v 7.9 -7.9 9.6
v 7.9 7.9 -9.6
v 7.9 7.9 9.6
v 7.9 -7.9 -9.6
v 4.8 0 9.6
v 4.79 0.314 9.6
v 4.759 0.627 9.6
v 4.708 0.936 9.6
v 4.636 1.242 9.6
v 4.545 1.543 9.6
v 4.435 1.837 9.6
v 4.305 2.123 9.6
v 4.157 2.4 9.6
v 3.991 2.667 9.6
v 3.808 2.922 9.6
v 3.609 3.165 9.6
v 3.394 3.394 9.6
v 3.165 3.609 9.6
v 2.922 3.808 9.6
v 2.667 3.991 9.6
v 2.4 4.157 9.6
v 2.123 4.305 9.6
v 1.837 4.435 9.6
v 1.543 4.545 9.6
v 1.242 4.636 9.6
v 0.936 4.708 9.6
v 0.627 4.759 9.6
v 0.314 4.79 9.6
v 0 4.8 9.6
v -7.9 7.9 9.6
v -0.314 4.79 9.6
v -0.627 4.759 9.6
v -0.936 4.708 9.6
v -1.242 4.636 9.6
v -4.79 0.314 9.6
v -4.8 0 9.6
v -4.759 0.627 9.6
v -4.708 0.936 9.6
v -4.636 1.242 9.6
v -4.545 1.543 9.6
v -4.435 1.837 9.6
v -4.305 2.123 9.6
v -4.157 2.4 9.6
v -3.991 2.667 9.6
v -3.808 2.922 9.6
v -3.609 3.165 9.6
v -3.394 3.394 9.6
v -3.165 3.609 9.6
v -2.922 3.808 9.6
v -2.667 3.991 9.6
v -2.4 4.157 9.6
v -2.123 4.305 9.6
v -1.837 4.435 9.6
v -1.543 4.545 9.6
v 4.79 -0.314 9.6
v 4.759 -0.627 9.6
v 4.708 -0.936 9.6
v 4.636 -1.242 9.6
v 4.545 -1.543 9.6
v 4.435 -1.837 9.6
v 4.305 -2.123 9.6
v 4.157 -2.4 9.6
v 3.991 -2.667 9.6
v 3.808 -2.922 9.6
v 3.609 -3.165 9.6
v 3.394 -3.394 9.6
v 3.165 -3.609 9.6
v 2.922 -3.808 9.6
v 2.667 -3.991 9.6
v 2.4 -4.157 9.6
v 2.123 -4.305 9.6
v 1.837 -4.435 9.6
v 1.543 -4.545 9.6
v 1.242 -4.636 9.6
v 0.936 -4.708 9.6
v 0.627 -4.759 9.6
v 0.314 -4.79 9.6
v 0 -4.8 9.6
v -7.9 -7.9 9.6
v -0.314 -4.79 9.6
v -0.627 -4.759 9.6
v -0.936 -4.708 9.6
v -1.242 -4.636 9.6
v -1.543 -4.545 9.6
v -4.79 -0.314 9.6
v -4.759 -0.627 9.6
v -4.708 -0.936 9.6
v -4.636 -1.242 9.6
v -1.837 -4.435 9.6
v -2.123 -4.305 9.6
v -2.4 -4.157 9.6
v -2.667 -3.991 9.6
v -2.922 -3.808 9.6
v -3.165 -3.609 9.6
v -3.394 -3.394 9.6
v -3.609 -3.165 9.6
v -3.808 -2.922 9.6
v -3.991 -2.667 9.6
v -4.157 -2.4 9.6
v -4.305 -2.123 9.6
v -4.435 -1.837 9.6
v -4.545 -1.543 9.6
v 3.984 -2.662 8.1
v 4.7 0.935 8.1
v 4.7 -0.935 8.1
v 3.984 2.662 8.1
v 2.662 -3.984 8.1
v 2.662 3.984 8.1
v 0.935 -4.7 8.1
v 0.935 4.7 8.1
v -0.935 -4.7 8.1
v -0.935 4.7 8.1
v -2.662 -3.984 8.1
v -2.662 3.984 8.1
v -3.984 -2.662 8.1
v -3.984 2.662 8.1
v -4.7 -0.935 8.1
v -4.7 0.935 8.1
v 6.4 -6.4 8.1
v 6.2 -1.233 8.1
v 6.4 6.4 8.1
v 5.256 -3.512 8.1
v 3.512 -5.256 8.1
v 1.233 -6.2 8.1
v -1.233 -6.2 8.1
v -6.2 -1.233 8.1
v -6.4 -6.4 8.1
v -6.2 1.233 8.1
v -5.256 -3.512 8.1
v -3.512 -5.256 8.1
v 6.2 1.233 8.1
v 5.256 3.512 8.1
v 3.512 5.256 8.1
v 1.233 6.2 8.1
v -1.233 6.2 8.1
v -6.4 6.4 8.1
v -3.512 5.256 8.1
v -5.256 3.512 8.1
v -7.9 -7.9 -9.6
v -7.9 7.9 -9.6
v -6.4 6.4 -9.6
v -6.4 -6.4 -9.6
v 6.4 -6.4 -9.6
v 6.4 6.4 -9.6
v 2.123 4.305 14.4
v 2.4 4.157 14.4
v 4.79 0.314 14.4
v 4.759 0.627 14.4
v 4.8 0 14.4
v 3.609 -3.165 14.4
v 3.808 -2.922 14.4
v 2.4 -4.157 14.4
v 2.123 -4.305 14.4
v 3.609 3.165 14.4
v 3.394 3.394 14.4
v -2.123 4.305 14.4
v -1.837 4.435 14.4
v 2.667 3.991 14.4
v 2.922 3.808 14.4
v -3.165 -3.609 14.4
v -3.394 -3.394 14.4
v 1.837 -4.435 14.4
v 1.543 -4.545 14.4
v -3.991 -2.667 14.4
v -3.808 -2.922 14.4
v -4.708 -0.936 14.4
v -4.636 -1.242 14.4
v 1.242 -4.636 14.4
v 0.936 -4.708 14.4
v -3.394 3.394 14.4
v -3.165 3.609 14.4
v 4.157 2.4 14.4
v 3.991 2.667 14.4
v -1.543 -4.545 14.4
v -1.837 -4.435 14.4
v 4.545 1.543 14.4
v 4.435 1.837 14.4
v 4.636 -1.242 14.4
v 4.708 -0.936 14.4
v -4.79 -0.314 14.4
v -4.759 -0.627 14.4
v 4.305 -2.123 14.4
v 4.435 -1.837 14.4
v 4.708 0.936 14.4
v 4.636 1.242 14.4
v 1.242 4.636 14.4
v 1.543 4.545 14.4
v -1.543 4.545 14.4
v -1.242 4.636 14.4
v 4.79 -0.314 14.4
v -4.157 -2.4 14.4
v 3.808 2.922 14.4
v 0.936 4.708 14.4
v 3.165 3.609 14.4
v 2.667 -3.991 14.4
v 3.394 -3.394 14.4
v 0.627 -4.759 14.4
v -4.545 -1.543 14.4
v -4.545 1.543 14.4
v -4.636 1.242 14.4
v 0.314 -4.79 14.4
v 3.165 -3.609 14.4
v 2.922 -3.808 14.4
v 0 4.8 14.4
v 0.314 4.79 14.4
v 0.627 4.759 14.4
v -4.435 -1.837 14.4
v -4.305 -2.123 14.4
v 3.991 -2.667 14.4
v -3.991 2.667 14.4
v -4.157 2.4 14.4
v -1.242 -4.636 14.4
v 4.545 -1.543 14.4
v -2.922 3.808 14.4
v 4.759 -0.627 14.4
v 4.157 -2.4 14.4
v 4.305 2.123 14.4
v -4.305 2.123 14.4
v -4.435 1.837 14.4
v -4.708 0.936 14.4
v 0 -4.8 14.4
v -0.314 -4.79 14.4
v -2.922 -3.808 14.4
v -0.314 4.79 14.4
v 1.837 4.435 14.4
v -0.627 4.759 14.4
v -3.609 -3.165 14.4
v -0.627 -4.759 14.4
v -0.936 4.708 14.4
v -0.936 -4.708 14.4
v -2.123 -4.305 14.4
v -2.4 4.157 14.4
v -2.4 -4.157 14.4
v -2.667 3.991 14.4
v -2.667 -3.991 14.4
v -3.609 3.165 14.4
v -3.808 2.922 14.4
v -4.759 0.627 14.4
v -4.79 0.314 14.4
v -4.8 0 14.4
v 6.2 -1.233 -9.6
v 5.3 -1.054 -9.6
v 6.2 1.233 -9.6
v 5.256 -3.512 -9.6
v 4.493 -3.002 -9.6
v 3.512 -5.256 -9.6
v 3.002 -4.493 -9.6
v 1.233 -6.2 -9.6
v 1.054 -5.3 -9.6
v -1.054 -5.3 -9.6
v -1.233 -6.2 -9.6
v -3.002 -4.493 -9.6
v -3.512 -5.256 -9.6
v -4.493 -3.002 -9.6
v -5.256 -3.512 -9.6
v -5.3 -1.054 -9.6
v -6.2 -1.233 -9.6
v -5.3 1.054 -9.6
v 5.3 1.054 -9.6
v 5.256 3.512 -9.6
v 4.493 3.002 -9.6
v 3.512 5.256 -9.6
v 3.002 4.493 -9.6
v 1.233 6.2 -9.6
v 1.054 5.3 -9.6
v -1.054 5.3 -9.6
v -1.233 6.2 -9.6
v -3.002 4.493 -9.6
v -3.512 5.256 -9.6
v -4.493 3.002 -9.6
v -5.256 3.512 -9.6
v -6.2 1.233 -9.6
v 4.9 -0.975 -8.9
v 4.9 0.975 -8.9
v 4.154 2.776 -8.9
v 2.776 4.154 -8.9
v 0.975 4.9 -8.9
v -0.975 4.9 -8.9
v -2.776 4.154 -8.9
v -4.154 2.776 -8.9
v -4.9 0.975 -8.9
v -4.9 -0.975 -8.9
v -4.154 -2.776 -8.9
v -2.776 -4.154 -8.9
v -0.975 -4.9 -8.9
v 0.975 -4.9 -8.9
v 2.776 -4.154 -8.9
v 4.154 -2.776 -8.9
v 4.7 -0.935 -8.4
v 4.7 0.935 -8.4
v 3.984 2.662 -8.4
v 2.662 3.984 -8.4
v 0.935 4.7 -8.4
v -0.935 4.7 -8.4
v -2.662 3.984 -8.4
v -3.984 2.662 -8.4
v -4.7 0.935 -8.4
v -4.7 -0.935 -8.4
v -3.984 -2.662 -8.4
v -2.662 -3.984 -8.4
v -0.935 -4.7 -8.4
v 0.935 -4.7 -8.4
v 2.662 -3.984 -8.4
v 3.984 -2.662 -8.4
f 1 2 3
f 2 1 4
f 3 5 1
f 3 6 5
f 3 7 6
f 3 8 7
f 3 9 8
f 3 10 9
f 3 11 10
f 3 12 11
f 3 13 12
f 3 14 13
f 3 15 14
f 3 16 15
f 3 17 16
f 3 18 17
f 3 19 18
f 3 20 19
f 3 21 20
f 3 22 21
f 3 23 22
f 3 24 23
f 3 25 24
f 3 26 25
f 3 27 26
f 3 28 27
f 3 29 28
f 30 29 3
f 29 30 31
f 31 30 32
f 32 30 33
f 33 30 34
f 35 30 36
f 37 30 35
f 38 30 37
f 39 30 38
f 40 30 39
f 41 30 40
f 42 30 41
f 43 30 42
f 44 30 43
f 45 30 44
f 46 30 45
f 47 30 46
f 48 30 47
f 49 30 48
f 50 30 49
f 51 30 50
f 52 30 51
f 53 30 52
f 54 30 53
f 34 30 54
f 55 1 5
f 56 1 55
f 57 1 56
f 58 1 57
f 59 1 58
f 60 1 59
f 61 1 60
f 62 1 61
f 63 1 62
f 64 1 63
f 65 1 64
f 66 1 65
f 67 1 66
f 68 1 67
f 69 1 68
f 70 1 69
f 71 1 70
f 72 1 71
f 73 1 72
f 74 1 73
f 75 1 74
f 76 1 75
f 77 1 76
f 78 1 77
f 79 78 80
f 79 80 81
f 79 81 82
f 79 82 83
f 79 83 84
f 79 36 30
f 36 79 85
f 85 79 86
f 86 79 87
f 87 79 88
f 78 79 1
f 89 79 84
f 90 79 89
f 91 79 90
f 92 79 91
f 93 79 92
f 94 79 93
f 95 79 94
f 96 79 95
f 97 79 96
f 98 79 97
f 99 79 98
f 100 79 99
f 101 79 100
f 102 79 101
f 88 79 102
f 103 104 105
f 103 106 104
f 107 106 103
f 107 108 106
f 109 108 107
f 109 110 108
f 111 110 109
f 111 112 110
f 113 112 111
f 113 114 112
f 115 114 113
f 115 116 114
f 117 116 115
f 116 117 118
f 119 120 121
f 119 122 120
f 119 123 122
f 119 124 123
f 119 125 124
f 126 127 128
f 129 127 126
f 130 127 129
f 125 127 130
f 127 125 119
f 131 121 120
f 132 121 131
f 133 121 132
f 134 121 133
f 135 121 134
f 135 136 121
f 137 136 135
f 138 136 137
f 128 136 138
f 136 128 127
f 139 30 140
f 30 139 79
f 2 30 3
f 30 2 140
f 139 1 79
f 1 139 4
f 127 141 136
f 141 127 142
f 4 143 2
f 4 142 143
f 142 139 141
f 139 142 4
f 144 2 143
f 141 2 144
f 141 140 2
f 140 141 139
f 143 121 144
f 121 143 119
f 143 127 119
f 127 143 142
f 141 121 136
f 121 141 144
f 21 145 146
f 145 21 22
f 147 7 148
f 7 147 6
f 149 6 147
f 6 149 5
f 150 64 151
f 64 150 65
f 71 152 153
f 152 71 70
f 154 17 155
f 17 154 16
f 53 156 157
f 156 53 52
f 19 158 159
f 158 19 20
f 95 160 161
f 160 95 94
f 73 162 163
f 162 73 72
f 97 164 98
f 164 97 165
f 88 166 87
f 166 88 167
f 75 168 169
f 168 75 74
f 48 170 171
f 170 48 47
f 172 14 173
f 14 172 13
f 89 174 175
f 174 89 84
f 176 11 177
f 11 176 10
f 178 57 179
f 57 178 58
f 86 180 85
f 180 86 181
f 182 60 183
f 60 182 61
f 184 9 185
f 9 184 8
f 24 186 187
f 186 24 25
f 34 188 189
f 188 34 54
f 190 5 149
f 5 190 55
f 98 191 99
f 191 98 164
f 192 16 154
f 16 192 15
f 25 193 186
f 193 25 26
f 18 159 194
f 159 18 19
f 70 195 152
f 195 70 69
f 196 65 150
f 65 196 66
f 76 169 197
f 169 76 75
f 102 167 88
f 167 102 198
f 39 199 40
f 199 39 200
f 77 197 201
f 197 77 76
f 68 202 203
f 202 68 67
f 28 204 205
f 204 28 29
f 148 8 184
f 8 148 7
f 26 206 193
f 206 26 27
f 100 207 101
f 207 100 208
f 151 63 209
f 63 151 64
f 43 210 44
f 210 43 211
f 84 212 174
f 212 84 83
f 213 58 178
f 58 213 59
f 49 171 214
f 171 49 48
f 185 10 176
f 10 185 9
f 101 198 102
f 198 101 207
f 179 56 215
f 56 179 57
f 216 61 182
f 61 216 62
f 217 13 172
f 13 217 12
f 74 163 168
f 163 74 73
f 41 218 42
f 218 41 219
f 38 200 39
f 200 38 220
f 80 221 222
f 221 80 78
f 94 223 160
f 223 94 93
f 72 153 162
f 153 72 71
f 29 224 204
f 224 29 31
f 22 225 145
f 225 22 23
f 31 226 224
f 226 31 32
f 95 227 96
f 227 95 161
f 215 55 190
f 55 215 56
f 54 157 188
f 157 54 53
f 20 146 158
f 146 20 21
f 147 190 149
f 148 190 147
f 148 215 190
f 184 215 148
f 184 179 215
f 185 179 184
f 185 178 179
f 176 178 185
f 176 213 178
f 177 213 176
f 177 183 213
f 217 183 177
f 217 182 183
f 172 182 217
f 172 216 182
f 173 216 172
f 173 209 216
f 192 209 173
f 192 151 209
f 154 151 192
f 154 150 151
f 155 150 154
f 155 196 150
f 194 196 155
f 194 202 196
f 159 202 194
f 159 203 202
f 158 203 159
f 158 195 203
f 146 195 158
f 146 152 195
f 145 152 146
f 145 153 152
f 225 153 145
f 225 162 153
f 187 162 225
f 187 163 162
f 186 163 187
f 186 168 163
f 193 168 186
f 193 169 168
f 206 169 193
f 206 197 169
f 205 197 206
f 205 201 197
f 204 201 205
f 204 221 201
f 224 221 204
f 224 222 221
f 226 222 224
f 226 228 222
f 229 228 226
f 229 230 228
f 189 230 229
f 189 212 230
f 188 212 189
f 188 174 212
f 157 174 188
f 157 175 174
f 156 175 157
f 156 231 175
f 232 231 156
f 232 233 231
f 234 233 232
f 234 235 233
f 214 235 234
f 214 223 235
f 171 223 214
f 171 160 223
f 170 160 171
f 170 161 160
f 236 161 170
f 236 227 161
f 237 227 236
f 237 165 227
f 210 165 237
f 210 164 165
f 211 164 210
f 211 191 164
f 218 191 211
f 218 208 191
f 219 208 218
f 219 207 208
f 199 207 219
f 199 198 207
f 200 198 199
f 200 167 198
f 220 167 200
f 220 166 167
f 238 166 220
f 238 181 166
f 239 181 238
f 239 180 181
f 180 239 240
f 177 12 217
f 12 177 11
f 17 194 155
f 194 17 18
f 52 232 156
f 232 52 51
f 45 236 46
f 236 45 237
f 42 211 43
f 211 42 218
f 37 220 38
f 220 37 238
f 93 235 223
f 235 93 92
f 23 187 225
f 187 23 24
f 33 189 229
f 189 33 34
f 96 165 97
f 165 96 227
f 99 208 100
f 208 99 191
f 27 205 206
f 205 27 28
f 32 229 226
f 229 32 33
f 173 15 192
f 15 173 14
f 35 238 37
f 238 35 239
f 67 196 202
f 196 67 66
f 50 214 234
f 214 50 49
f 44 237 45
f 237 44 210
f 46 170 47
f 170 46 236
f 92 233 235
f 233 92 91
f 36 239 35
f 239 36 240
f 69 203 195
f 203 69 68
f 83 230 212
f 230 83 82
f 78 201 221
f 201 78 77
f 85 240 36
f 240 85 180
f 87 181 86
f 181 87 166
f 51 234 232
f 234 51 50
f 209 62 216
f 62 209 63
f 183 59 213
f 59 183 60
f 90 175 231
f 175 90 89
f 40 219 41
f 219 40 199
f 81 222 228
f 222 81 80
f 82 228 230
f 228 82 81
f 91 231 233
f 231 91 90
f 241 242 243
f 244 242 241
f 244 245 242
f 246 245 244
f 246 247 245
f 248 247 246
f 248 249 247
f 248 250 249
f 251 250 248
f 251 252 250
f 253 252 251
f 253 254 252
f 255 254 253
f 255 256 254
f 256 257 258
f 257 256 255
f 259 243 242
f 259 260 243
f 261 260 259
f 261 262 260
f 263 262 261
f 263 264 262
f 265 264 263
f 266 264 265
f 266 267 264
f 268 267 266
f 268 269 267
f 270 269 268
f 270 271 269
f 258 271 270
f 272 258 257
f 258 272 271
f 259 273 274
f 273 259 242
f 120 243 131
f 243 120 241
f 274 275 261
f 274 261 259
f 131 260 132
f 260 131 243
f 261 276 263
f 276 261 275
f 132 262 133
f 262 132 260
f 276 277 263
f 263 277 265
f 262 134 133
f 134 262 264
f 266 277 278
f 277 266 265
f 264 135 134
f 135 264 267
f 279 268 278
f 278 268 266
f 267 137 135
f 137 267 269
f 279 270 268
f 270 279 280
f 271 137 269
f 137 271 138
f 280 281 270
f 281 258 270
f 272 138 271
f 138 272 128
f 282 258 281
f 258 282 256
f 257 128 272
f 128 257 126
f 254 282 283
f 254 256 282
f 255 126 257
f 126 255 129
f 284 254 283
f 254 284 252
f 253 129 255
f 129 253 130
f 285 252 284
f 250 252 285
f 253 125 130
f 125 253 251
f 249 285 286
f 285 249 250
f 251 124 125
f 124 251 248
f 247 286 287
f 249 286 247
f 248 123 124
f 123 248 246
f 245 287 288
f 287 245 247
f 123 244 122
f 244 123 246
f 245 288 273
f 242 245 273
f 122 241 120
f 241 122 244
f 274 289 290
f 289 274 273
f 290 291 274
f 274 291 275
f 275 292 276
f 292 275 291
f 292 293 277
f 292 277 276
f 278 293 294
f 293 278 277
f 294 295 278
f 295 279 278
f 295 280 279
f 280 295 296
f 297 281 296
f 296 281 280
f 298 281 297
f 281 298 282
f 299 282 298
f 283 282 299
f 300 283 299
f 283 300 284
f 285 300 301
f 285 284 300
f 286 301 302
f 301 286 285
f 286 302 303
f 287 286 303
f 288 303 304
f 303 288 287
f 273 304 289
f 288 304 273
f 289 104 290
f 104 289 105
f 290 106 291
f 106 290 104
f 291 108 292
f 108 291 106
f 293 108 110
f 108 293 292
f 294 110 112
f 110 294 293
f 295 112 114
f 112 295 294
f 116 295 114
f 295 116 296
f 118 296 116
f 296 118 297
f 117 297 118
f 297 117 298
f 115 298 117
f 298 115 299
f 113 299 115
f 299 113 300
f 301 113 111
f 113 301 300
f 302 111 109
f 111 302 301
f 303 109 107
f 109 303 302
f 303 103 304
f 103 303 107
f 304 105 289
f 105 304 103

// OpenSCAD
// Custom 16 mm pitch construction brick; units: millimetres.
// Generated from geometry.py. Not a certified LEGO/Duplo part.
// Test material, fit and printer tolerances before physical use.
// Shape: [1, 1]; nominal radial interference: 0.1 mm.
$fn = 96;
union() {
  // roof; simulation contact: hard
  translate([0, 0, 8.85]) cube([15.8, 15.8, 1.5], center=true);
  // wall_x_neg; simulation contact: hard
  translate([-7.15, 0, -0.75]) cube([1.5, 15.8, 17.7], center=true);
  // wall_x_pos; simulation contact: hard
  translate([7.15, 0, -0.75]) cube([1.5, 15.8, 17.7], center=true);
  // wall_y_neg; simulation contact: hard
  translate([0, -7.15, -0.75]) cube([12.8, 1.5, 17.7], center=true);
  // wall_y_pos; simulation contact: hard
  translate([0, 7.15, -0.75]) cube([12.8, 1.5, 17.7], center=true);
  // stud_0; simulation contact: hard
  translate([0, 0, 12]) cylinder(h=4.8, r=4.8, center=true);
  // socket_0_entrance_00; simulation contact: hard
  polyhedron(points=[[5.3, -1.05423555, -9.6], [6.2, -1.23325668, -9.6], [6.2, 1.23325668, -9.6], [5.3, 1.05423555, -9.6], [4.9, -0.9746706, -8.9], [6.2, -1.23325668, -8.9], [6.2, 1.23325668, -8.9], [4.9, 0.9746706, -8.9]], faces=[[0, 1, 2, 3], [7, 6, 5, 4], [4, 5, 1, 0], [5, 6, 2, 1], [6, 7, 3, 2], [7, 4, 0, 3]], convexity=4);
  // socket_0_entrance_01; simulation contact: hard
  polyhedron(points=[[5.3, 1.05423555, -9.6], [6.2, 1.23325668, -9.6], [5.2561062, 3.51201788, -9.6], [4.49312304, 3.00220884, -9.6], [4.9, 0.9746706, -8.9], [6.2, 1.23325668, -8.9], [5.2561062, 3.51201788, -8.9], [4.15401942, 2.77562704, -8.9]], faces=[[0, 1, 2, 3], [7, 6, 5, 4], [4, 5, 1, 0], [5, 6, 2, 1], [6, 7, 3, 2], [7, 4, 0, 3]], convexity=4);
  // socket_0_entrance_02; simulation contact: hard
  polyhedron(points=[[4.49312304, 3.00220884, -9.6], [5.2561062, 3.51201788, -9.6], [3.51201788, 5.2561062, -9.6], [3.00220884, 4.49312304, -9.6], [4.15401942, 2.77562704, -8.9], [5.2561062, 3.51201788, -8.9], [3.51201788, 5.2561062, -8.9], [2.77562704, 4.15401942, -8.9]], faces=[[0, 1, 2, 3], [7, 6, 5, 4], [4, 5, 1, 0], [5, 6, 2, 1], [6, 7, 3, 2], [7, 4, 0, 3]], convexity=4);
  // socket_0_entrance_03; simulation contact: hard
  polyhedron(points=[[3.00220884, 4.49312304, -9.6], [3.51201788, 5.2561062, -9.6], [1.23325668, 6.2, -9.6], [1.05423555, 5.3, -9.6], [2.77562704, 4.15401942, -8.9], [3.51201788, 5.2561062, -8.9], [1.23325668, 6.2, -8.9], [0.9746706, 4.9, -8.9]], faces=[[0, 1, 2, 3], [7, 6, 5, 4], [4, 5, 1, 0], [5, 6, 2, 1], [6, 7, 3, 2], [7, 4, 0, 3]], convexity=4);
  // socket_0_entrance_04; simulation contact: hard
  polyhedron(points=[[1.05423555, 5.3, -9.6], [1.23325668, 6.2, -9.6], [-1.23325668, 6.2, -9.6], [-1.05423555, 5.3, -9.6], [0.9746706, 4.9, -8.9], [1.23325668, 6.2, -8.9], [-1.23325668, 6.2, -8.9], [-0.9746706, 4.9, -8.9]], faces=[[0, 1, 2, 3], [7, 6, 5, 4], [4, 5, 1, 0], [5, 6, 2, 1], [6, 7, 3, 2], [7, 4, 0, 3]], convexity=4);
  // socket_0_entrance_05; simulation contact: hard
  polyhedron(points=[[-1.05423555, 5.3, -9.6], [-1.23325668, 6.2, -9.6], [-3.51201788, 5.2561062, -9.6], [-3.00220884, 4.49312304, -9.6], [-0.9746706, 4.9, -8.9], [-1.23325668, 6.2, -8.9], [-3.51201788, 5.2561062, -8.9], [-2.77562704, 4.15401942, -8.9]], faces=[[0, 1, 2, 3], [7, 6, 5, 4], [4, 5, 1, 0], [5, 6, 2, 1], [6, 7, 3, 2], [7, 4, 0, 3]], convexity=4);
  // socket_0_entrance_06; simulation contact: hard
  polyhedron(points=[[-3.00220884, 4.49312304, -9.6], [-3.51201788, 5.2561062, -9.6], [-5.2561062, 3.51201788, -9.6], [-4.49312304, 3.00220884, -9.6], [-2.77562704, 4.15401942, -8.9], [-3.51201788, 5.2561062, -8.9], [-5.2561062, 3.51201788, -8.9], [-4.15401942, 2.77562704, -8.9]], faces=[[0, 1, 2, 3], [7, 6, 5, 4], [4, 5, 1, 0], [5, 6, 2, 1], [6, 7, 3, 2], [7, 4, 0, 3]], convexity=4);
  // socket_0_entrance_07; simulation contact: hard
  polyhedron(points=[[-4.49312304, 3.00220884, -9.6], [-5.2561062, 3.51201788, -9.6], [-6.2, 1.23325668, -9.6], [-5.3, 1.05423555, -9.6], [-4.15401942, 2.77562704, -8.9], [-5.2561062, 3.51201788, -8.9], [-6.2, 1.23325668, -8.9], [-4.9, 0.9746706, -8.9]], faces=[[0, 1, 2, 3], [7, 6, 5, 4], [4, 5, 1, 0], [5, 6, 2, 1], [6, 7, 3, 2], [7, 4, 0, 3]], convexity=4);
  // socket_0_entrance_08; simulation contact: hard
  polyhedron(points=[[-5.3, 1.05423555, -9.6], [-6.2, 1.23325668, -9.6], [-6.2, -1.23325668, -9.6], [-5.3, -1.05423555, -9.6], [-4.9, 0.9746706, -8.9], [-6.2, 1.23325668, -8.9], [-6.2, -1.23325668, -8.9], [-4.9, -0.9746706, -8.9]], faces=[[0, 1, 2, 3], [7, 6, 5, 4], [4, 5, 1, 0], [5, 6, 2, 1], [6, 7, 3, 2], [7, 4, 0, 3]], convexity=4);
  // socket_0_entrance_09; simulation contact: hard
  polyhedron(points=[[-5.3, -1.05423555, -9.6], [-6.2, -1.23325668, -9.6], [-5.2561062, -3.51201788, -9.6], [-4.49312304, -3.00220884, -9.6], [-4.9, -0.9746706, -8.9], [-6.2, -1.23325668, -8.9], [-5.2561062, -3.51201788, -8.9], [-4.15401942, -2.77562704, -8.9]], faces=[[0, 1, 2, 3], [7, 6, 5, 4], [4, 5, 1, 0], [5, 6, 2, 1], [6, 7, 3, 2], [7, 4, 0, 3]], convexity=4);
  // socket_0_entrance_10; simulation contact: hard
  polyhedron(points=[[-4.49312304, -3.00220884, -9.6], [-5.2561062, -3.51201788, -9.6], [-3.51201788, -5.2561062, -9.6], [-3.00220884, -4.49312304, -9.6], [-4.15401942, -2.77562704, -8.9], [-5.2561062, -3.51201788, -8.9], [-3.51201788, -5.2561062, -8.9], [-2.77562704, -4.15401942, -8.9]], faces=[[0, 1, 2, 3], [7, 6, 5, 4], [4, 5, 1, 0], [5, 6, 2, 1], [6, 7, 3, 2], [7, 4, 0, 3]], convexity=4);
  // socket_0_entrance_11; simulation contact: hard
  polyhedron(points=[[-3.00220884, -4.49312304, -9.6], [-3.51201788, -5.2561062, -9.6], [-1.23325668, -6.2, -9.6], [-1.05423555, -5.3, -9.6], [-2.77562704, -4.15401942, -8.9], [-3.51201788, -5.2561062, -8.9], [-1.23325668, -6.2, -8.9], [-0.9746706, -4.9, -8.9]], faces=[[0, 1, 2, 3], [7, 6, 5, 4], [4, 5, 1, 0], [5, 6, 2, 1], [6, 7, 3, 2], [7, 4, 0, 3]], convexity=4);
  // socket_0_entrance_12; simulation contact: hard
  polyhedron(points=[[-1.05423555, -5.3, -9.6], [-1.23325668, -6.2, -9.6], [1.23325668, -6.2, -9.6], [1.05423555, -5.3, -9.6], [-0.9746706, -4.9, -8.9], [-1.23325668, -6.2, -8.9], [1.23325668, -6.2, -8.9], [0.9746706, -4.9, -8.9]], faces=[[0, 1, 2, 3], [7, 6, 5, 4], [4, 5, 1, 0], [5, 6, 2, 1], [6, 7, 3, 2], [7, 4, 0, 3]], convexity=4);
  // socket_0_entrance_13; simulation contact: hard
  polyhedron(points=[[1.05423555, -5.3, -9.6], [1.23325668, -6.2, -9.6], [3.51201788, -5.2561062, -9.6], [3.00220884, -4.49312304, -9.6], [0.9746706, -4.9, -8.9], [1.23325668, -6.2, -8.9], [3.51201788, -5.2561062, -8.9], [2.77562704, -4.15401942, -8.9]], faces=[[0, 1, 2, 3], [7, 6, 5, 4], [4, 5, 1, 0], [5, 6, 2, 1], [6, 7, 3, 2], [7, 4, 0, 3]], convexity=4);
  // socket_0_entrance_14; simulation contact: hard
  polyhedron(points=[[3.00220884, -4.49312304, -9.6], [3.51201788, -5.2561062, -9.6], [5.2561062, -3.51201788, -9.6], [4.49312304, -3.00220884, -9.6], [2.77562704, -4.15401942, -8.9], [3.51201788, -5.2561062, -8.9], [5.2561062, -3.51201788, -8.9], [4.15401942, -2.77562704, -8.9]], faces=[[0, 1, 2, 3], [7, 6, 5, 4], [4, 5, 1, 0], [5, 6, 2, 1], [6, 7, 3, 2], [7, 4, 0, 3]], convexity=4);
  // socket_0_entrance_15; simulation contact: hard
  polyhedron(points=[[4.49312304, -3.00220884, -9.6], [5.2561062, -3.51201788, -9.6], [6.2, -1.23325668, -9.6], [5.3, -1.05423555, -9.6], [4.15401942, -2.77562704, -8.9], [5.2561062, -3.51201788, -8.9], [6.2, -1.23325668, -8.9], [4.9, -0.9746706, -8.9]], faces=[[0, 1, 2, 3], [7, 6, 5, 4], [4, 5, 1, 0], [5, 6, 2, 1], [6, 7, 3, 2], [7, 4, 0, 3]], convexity=4);
  // socket_0_taper_00; simulation contact: compliant
  polyhedron(points=[[4.9, -0.9746706, -8.9], [6.2, -1.23325668, -8.9], [6.2, 1.23325668, -8.9], [4.9, 0.9746706, -8.9], [4.7, -0.934888127, -8.4], [6.2, -1.23325668, -8.4], [6.2, 1.23325668, -8.4], [4.7, 0.934888127, -8.4]], faces=[[0, 1, 2, 3], [7, 6, 5, 4], [4, 5, 1, 0], [5, 6, 2, 1], [6, 7, 3, 2], [7, 4, 0, 3]], convexity=4);
  // socket_0_taper_01; simulation contact: compliant
  polyhedron(points=[[4.9, 0.9746706, -8.9], [6.2, 1.23325668, -8.9], [5.2561062, 3.51201788, -8.9], [4.15401942, 2.77562704, -8.9], [4.7, 0.934888127, -8.4], [6.2, 1.23325668, -8.4], [5.2561062, 3.51201788, -8.4], [3.98446761, 2.66233614, -8.4]], faces=[[0, 1, 2, 3], [7, 6, 5, 4], [4, 5, 1, 0], [5, 6, 2, 1], [6, 7, 3, 2], [7, 4, 0, 3]], convexity=4);
  // socket_0_taper_02; simulation contact: compliant
  polyhedron(points=[[4.15401942, 2.77562704, -8.9], [5.2561062, 3.51201788, -8.9], [3.51201788, 5.2561062, -8.9], [2.77562704, 4.15401942, -8.9], [3.98446761, 2.66233614, -8.4], [5.2561062, 3.51201788, -8.4], [3.51201788, 5.2561062, -8.4], [2.66233614, 3.98446761, -8.4]], faces=[[0, 1, 2, 3], [7, 6, 5, 4], [4, 5, 1, 0], [5, 6, 2, 1], [6, 7, 3, 2], [7, 4, 0, 3]], convexity=4);
  // socket_0_taper_03; simulation contact: compliant
  polyhedron(points=[[2.77562704, 4.15401942, -8.9], [3.51201788, 5.2561062, -8.9], [1.23325668, 6.2, -8.9], [0.9746706, 4.9, -8.9], [2.66233614, 3.98446761, -8.4], [3.51201788, 5.2561062, -8.4], [1.23325668, 6.2, -8.4], [0.934888127, 4.7, -8.4]], faces=[[0, 1, 2, 3], [7, 6, 5, 4], [4, 5, 1, 0], [5, 6, 2, 1], [6, 7, 3, 2], [7, 4, 0, 3]], convexity=4);
  // socket_0_taper_04; simulation contact: compliant
  polyhedron(points=[[0.9746706, 4.9, -8.9], [1.23325668, 6.2, -8.9], [-1.23325668, 6.2, -8.9], [-0.9746706, 4.9, -8.9], [0.934888127, 4.7, -8.4], [1.23325668, 6.2, -8.4], [-1.23325668, 6.2, -8.4], [-0.934888127, 4.7, -8.4]], faces=[[0, 1, 2, 3], [7, 6, 5, 4], [4, 5, 1, 0], [5, 6, 2, 1], [6, 7, 3, 2], [7, 4, 0, 3]], convexity=4);
  // socket_0_taper_05; simulation contact: compliant
  polyhedron(points=[[-0.9746706, 4.9, -8.9], [-1.23325668, 6.2, -8.9], [-3.51201788, 5.2561062, -8.9], [-2.77562704, 4.15401942, -8.9], [-0.934888127, 4.7, -8.4], [-1.23325668, 6.2, -8.4], [-3.51201788, 5.2561062, -8.4], [-2.66233614, 3.98446761, -8.4]], faces=[[0, 1, 2, 3], [7, 6, 5, 4], [4, 5, 1, 0], [5, 6, 2, 1], [6, 7, 3, 2], [7, 4, 0, 3]], convexity=4);
  // socket_0_taper_06; simulation contact: compliant
  polyhedron(points=[[-2.77562704, 4.15401942, -8.9], [-3.51201788, 5.2561062, -8.9], [-5.2561062, 3.51201788, -8.9], [-4.15401942, 2.77562704, -8.9], [-2.66233614, 3.98446761, -8.4], [-3.51201788, 5.2561062, -8.4], [-5.2561062, 3.51201788, -8.4], [-3.98446761, 2.66233614, -8.4]], faces=[[0, 1, 2, 3], [7, 6, 5, 4], [4, 5, 1, 0], [5, 6, 2, 1], [6, 7, 3, 2], [7, 4, 0, 3]], convexity=4);
  // socket_0_taper_07; simulation contact: compliant
  polyhedron(points=[[-4.15401942, 2.77562704, -8.9], [-5.2561062, 3.51201788, -8.9], [-6.2, 1.23325668, -8.9], [-4.9, 0.9746706, -8.9], [-3.98446761, 2.66233614, -8.4], [-5.2561062, 3.51201788, -8.4], [-6.2, 1.23325668, -8.4], [-4.7, 0.934888127, -8.4]], faces=[[0, 1, 2, 3], [7, 6, 5, 4], [4, 5, 1, 0], [5, 6, 2, 1], [6, 7, 3, 2], [7, 4, 0, 3]], convexity=4);
  // socket_0_taper_08; simulation contact: compliant
  polyhedron(points=[[-4.9, 0.9746706, -8.9], [-6.2, 1.23325668, -8.9], [-6.2, -1.23325668, -8.9], [-4.9, -0.9746706, -8.9], [-4.7, 0.934888127, -8.4], [-6.2, 1.23325668, -8.4], [-6.2, -1.23325668, -8.4], [-4.7, -0.934888127, -8.4]], faces=[[0, 1, 2, 3], [7, 6, 5, 4], [4, 5, 1, 0], [5, 6, 2, 1], [6, 7, 3, 2], [7, 4, 0, 3]], convexity=4);
  // socket_0_taper_09; simulation contact: compliant
  polyhedron(points=[[-4.9, -0.9746706, -8.9], [-6.2, -1.23325668, -8.9], [-5.2561062, -3.51201788, -8.9], [-4.15401942, -2.77562704, -8.9], [-4.7, -0.934888127, -8.4], [-6.2, -1.23325668, -8.4], [-5.2561062, -3.51201788, -8.4], [-3.98446761, -2.66233614, -8.4]], faces=[[0, 1, 2, 3], [7, 6, 5, 4], [4, 5, 1, 0], [5, 6, 2, 1], [6, 7, 3, 2], [7, 4, 0, 3]], convexity=4);
  // socket_0_taper_10; simulation contact: compliant
  polyhedron(points=[[-4.15401942, -2.77562704, -8.9], [-5.2561062, -3.51201788, -8.9], [-3.51201788, -5.2561062, -8.9], [-2.77562704, -4.15401942, -8.9], [-3.98446761, -2.66233614, -8.4], [-5.2561062, -3.51201788, -8.4], [-3.51201788, -5.2561062, -8.4], [-2.66233614, -3.98446761, -8.4]], faces=[[0, 1, 2, 3], [7, 6, 5, 4], [4, 5, 1, 0], [5, 6, 2, 1], [6, 7, 3, 2], [7, 4, 0, 3]], convexity=4);
  // socket_0_taper_11; simulation contact: compliant
  polyhedron(points=[[-2.77562704, -4.15401942, -8.9], [-3.51201788, -5.2561062, -8.9], [-1.23325668, -6.2, -8.9], [-0.9746706, -4.9, -8.9], [-2.66233614, -3.98446761, -8.4], [-3.51201788, -5.2561062, -8.4], [-1.23325668, -6.2, -8.4], [-0.934888127, -4.7, -8.4]], faces=[[0, 1, 2, 3], [7, 6, 5, 4], [4, 5, 1, 0], [5, 6, 2, 1], [6, 7, 3, 2], [7, 4, 0, 3]], convexity=4);
  // socket_0_taper_12; simulation contact: compliant
  polyhedron(points=[[-0.9746706, -4.9, -8.9], [-1.23325668, -6.2, -8.9], [1.23325668, -6.2, -8.9], [0.9746706, -4.9, -8.9], [-0.934888127, -4.7, -8.4], [-1.23325668, -6.2, -8.4], [1.23325668, -6.2, -8.4], [0.934888127, -4.7, -8.4]], faces=[[0, 1, 2, 3], [7, 6, 5, 4], [4, 5, 1, 0], [5, 6, 2, 1], [6, 7, 3, 2], [7, 4, 0, 3]], convexity=4);
  // socket_0_taper_13; simulation contact: compliant
  polyhedron(points=[[0.9746706, -4.9, -8.9], [1.23325668, -6.2, -8.9], [3.51201788, -5.2561062, -8.9], [2.77562704, -4.15401942, -8.9], [0.934888127, -4.7, -8.4], [1.23325668, -6.2, -8.4], [3.51201788, -5.2561062, -8.4], [2.66233614, -3.98446761, -8.4]], faces=[[0, 1, 2, 3], [7, 6, 5, 4], [4, 5, 1, 0], [5, 6, 2, 1], [6, 7, 3, 2], [7, 4, 0, 3]], convexity=4);
  // socket_0_taper_14; simulation contact: compliant
  polyhedron(points=[[2.77562704, -4.15401942, -8.9], [3.51201788, -5.2561062, -8.9], [5.2561062, -3.51201788, -8.9], [4.15401942, -2.77562704, -8.9], [2.66233614, -3.98446761, -8.4], [3.51201788, -5.2561062, -8.4], [5.2561062, -3.51201788, -8.4], [3.98446761, -2.66233614, -8.4]], faces=[[0, 1, 2, 3], [7, 6, 5, 4], [4, 5, 1, 0], [5, 6, 2, 1], [6, 7, 3, 2], [7, 4, 0, 3]], convexity=4);
  // socket_0_taper_15; simulation contact: compliant
  polyhedron(points=[[4.15401942, -2.77562704, -8.9], [5.2561062, -3.51201788, -8.9], [6.2, -1.23325668, -8.9], [4.9, -0.9746706, -8.9], [3.98446761, -2.66233614, -8.4], [5.2561062, -3.51201788, -8.4], [6.2, -1.23325668, -8.4], [4.7, -0.934888127, -8.4]], faces=[[0, 1, 2, 3], [7, 6, 5, 4], [4, 5, 1, 0], [5, 6, 2, 1], [6, 7, 3, 2], [7, 4, 0, 3]], convexity=4);
  // socket_0_land_00; simulation contact: compliant
  polyhedron(points=[[4.7, -0.934888127, -8.4], [6.2, -1.23325668, -8.4], [6.2, 1.23325668, -8.4], [4.7, 0.934888127, -8.4], [4.7, -0.934888127, 8.1], [6.2, -1.23325668, 8.1], [6.2, 1.23325668, 8.1], [4.7, 0.934888127, 8.1]], faces=[[0, 1, 2, 3], [7, 6, 5, 4], [4, 5, 1, 0], [5, 6, 2, 1], [6, 7, 3, 2], [7, 4, 0, 3]], convexity=4);
  // socket_0_land_01; simulation contact: compliant
  polyhedron(points=[[4.7, 0.934888127, -8.4], [6.2, 1.23325668, -8.4], [5.2561062, 3.51201788, -8.4], [3.98446761, 2.66233614, -8.4], [4.7, 0.934888127, 8.1], [6.2, 1.23325668, 8.1], [5.2561062, 3.51201788, 8.1], [3.98446761, 2.66233614, 8.1]], faces=[[0, 1, 2, 3], [7, 6, 5, 4], [4, 5, 1, 0], [5, 6, 2, 1], [6, 7, 3, 2], [7, 4, 0, 3]], convexity=4);
  // socket_0_land_02; simulation contact: compliant
  polyhedron(points=[[3.98446761, 2.66233614, -8.4], [5.2561062, 3.51201788, -8.4], [3.51201788, 5.2561062, -8.4], [2.66233614, 3.98446761, -8.4], [3.98446761, 2.66233614, 8.1], [5.2561062, 3.51201788, 8.1], [3.51201788, 5.2561062, 8.1], [2.66233614, 3.98446761, 8.1]], faces=[[0, 1, 2, 3], [7, 6, 5, 4], [4, 5, 1, 0], [5, 6, 2, 1], [6, 7, 3, 2], [7, 4, 0, 3]], convexity=4);
  // socket_0_land_03; simulation contact: compliant
  polyhedron(points=[[2.66233614, 3.98446761, -8.4], [3.51201788, 5.2561062, -8.4], [1.23325668, 6.2, -8.4], [0.934888127, 4.7, -8.4], [2.66233614, 3.98446761, 8.1], [3.51201788, 5.2561062, 8.1], [1.23325668, 6.2, 8.1], [0.934888127, 4.7, 8.1]], faces=[[0, 1, 2, 3], [7, 6, 5, 4], [4, 5, 1, 0], [5, 6, 2, 1], [6, 7, 3, 2], [7, 4, 0, 3]], convexity=4);
  // socket_0_land_04; simulation contact: compliant
  polyhedron(points=[[0.934888127, 4.7, -8.4], [1.23325668, 6.2, -8.4], [-1.23325668, 6.2, -8.4], [-0.934888127, 4.7, -8.4], [0.934888127, 4.7, 8.1], [1.23325668, 6.2, 8.1], [-1.23325668, 6.2, 8.1], [-0.934888127, 4.7, 8.1]], faces=[[0, 1, 2, 3], [7, 6, 5, 4], [4, 5, 1, 0], [5, 6, 2, 1], [6, 7, 3, 2], [7, 4, 0, 3]], convexity=4);
  // socket_0_land_05; simulation contact: compliant
  polyhedron(points=[[-0.934888127, 4.7, -8.4], [-1.23325668, 6.2, -8.4], [-3.51201788, 5.2561062, -8.4], [-2.66233614, 3.98446761, -8.4], [-0.934888127, 4.7, 8.1], [-1.23325668, 6.2, 8.1], [-3.51201788, 5.2561062, 8.1], [-2.66233614, 3.98446761, 8.1]], faces=[[0, 1, 2, 3], [7, 6, 5, 4], [4, 5, 1, 0], [5, 6, 2, 1], [6, 7, 3, 2], [7, 4, 0, 3]], convexity=4);
  // socket_0_land_06; simulation contact: compliant
  polyhedron(points=[[-2.66233614, 3.98446761, -8.4], [-3.51201788, 5.2561062, -8.4], [-5.2561062, 3.51201788, -8.4], [-3.98446761, 2.66233614, -8.4], [-2.66233614, 3.98446761, 8.1], [-3.51201788, 5.2561062, 8.1], [-5.2561062, 3.51201788, 8.1], [-3.98446761, 2.66233614, 8.1]], faces=[[0, 1, 2, 3], [7, 6, 5, 4], [4, 5, 1, 0], [5, 6, 2, 1], [6, 7, 3, 2], [7, 4, 0, 3]], convexity=4);
  // socket_0_land_07; simulation contact: compliant
  polyhedron(points=[[-3.98446761, 2.66233614, -8.4], [-5.2561062, 3.51201788, -8.4], [-6.2, 1.23325668, -8.4], [-4.7, 0.934888127, -8.4], [-3.98446761, 2.66233614, 8.1], [-5.2561062, 3.51201788, 8.1], [-6.2, 1.23325668, 8.1], [-4.7, 0.934888127, 8.1]], faces=[[0, 1, 2, 3], [7, 6, 5, 4], [4, 5, 1, 0], [5, 6, 2, 1], [6, 7, 3, 2], [7, 4, 0, 3]], convexity=4);
  // socket_0_land_08; simulation contact: compliant
  polyhedron(points=[[-4.7, 0.934888127, -8.4], [-6.2, 1.23325668, -8.4], [-6.2, -1.23325668, -8.4], [-4.7, -0.934888127, -8.4], [-4.7, 0.934888127, 8.1], [-6.2, 1.23325668, 8.1], [-6.2, -1.23325668, 8.1], [-4.7, -0.934888127, 8.1]], faces=[[0, 1, 2, 3], [7, 6, 5, 4], [4, 5, 1, 0], [5, 6, 2, 1], [6, 7, 3, 2], [7, 4, 0, 3]], convexity=4);
  // socket_0_land_09; simulation contact: compliant
  polyhedron(points=[[-4.7, -0.934888127, -8.4], [-6.2, -1.23325668, -8.4], [-5.2561062, -3.51201788, -8.4], [-3.98446761, -2.66233614, -8.4], [-4.7, -0.934888127, 8.1], [-6.2, -1.23325668, 8.1], [-5.2561062, -3.51201788, 8.1], [-3.98446761, -2.66233614, 8.1]], faces=[[0, 1, 2, 3], [7, 6, 5, 4], [4, 5, 1, 0], [5, 6, 2, 1], [6, 7, 3, 2], [7, 4, 0, 3]], convexity=4);
  // socket_0_land_10; simulation contact: compliant
  polyhedron(points=[[-3.98446761, -2.66233614, -8.4], [-5.2561062, -3.51201788, -8.4], [-3.51201788, -5.2561062, -8.4], [-2.66233614, -3.98446761, -8.4], [-3.98446761, -2.66233614, 8.1], [-5.2561062, -3.51201788, 8.1], [-3.51201788, -5.2561062, 8.1], [-2.66233614, -3.98446761, 8.1]], faces=[[0, 1, 2, 3], [7, 6, 5, 4], [4, 5, 1, 0], [5, 6, 2, 1], [6, 7, 3, 2], [7, 4, 0, 3]], convexity=4);
  // socket_0_land_11; simulation contact: compliant
  polyhedron(points=[[-2.66233614, -3.98446761, -8.4], [-3.51201788, -5.2561062, -8.4], [-1.23325668, -6.2, -8.4], [-0.934888127, -4.7, -8.4], [-2.66233614, -3.98446761, 8.1], [-3.51201788, -5.2561062, 8.1], [-1.23325668, -6.2, 8.1], [-0.934888127, -4.7, 8.1]], faces=[[0, 1, 2, 3], [7, 6, 5, 4], [4, 5, 1, 0], [5, 6, 2, 1], [6, 7, 3, 2], [7, 4, 0, 3]], convexity=4);
  // socket_0_land_12; simulation contact: compliant
  polyhedron(points=[[-0.934888127, -4.7, -8.4], [-1.23325668, -6.2, -8.4], [1.23325668, -6.2, -8.4], [0.934888127, -4.7, -8.4], [-0.934888127, -4.7, 8.1], [-1.23325668, -6.2, 8.1], [1.23325668, -6.2, 8.1], [0.934888127, -4.7, 8.1]], faces=[[0, 1, 2, 3], [7, 6, 5, 4], [4, 5, 1, 0], [5, 6, 2, 1], [6, 7, 3, 2], [7, 4, 0, 3]], convexity=4);
  // socket_0_land_13; simulation contact: compliant
  polyhedron(points=[[0.934888127, -4.7, -8.4], [1.23325668, -6.2, -8.4], [3.51201788, -5.2561062, -8.4], [2.66233614, -3.98446761, -8.4], [0.934888127, -4.7, 8.1], [1.23325668, -6.2, 8.1], [3.51201788, -5.2561062, 8.1], [2.66233614, -3.98446761, 8.1]], faces=[[0, 1, 2, 3], [7, 6, 5, 4], [4, 5, 1, 0], [5, 6, 2, 1], [6, 7, 3, 2], [7, 4, 0, 3]], convexity=4);
  // socket_0_land_14; simulation contact: compliant
  polyhedron(points=[[2.66233614, -3.98446761, -8.4], [3.51201788, -5.2561062, -8.4], [5.2561062, -3.51201788, -8.4], [3.98446761, -2.66233614, -8.4], [2.66233614, -3.98446761, 8.1], [3.51201788, -5.2561062, 8.1], [5.2561062, -3.51201788, 8.1], [3.98446761, -2.66233614, 8.1]], faces=[[0, 1, 2, 3], [7, 6, 5, 4], [4, 5, 1, 0], [5, 6, 2, 1], [6, 7, 3, 2], [7, 4, 0, 3]], convexity=4);
  // socket_0_land_15; simulation contact: compliant
  polyhedron(points=[[3.98446761, -2.66233614, -8.4], [5.2561062, -3.51201788, -8.4], [6.2, -1.23325668, -8.4], [4.7, -0.934888127, -8.4], [3.98446761, -2.66233614, 8.1], [5.2561062, -3.51201788, 8.1], [6.2, -1.23325668, 8.1], [4.7, -0.934888127, 8.1]], faces=[[0, 1, 2, 3], [7, 6, 5, 4], [4, 5, 1, 0], [5, 6, 2, 1], [6, 7, 3, 2], [7, 4, 0, 3]], convexity=4);
}
